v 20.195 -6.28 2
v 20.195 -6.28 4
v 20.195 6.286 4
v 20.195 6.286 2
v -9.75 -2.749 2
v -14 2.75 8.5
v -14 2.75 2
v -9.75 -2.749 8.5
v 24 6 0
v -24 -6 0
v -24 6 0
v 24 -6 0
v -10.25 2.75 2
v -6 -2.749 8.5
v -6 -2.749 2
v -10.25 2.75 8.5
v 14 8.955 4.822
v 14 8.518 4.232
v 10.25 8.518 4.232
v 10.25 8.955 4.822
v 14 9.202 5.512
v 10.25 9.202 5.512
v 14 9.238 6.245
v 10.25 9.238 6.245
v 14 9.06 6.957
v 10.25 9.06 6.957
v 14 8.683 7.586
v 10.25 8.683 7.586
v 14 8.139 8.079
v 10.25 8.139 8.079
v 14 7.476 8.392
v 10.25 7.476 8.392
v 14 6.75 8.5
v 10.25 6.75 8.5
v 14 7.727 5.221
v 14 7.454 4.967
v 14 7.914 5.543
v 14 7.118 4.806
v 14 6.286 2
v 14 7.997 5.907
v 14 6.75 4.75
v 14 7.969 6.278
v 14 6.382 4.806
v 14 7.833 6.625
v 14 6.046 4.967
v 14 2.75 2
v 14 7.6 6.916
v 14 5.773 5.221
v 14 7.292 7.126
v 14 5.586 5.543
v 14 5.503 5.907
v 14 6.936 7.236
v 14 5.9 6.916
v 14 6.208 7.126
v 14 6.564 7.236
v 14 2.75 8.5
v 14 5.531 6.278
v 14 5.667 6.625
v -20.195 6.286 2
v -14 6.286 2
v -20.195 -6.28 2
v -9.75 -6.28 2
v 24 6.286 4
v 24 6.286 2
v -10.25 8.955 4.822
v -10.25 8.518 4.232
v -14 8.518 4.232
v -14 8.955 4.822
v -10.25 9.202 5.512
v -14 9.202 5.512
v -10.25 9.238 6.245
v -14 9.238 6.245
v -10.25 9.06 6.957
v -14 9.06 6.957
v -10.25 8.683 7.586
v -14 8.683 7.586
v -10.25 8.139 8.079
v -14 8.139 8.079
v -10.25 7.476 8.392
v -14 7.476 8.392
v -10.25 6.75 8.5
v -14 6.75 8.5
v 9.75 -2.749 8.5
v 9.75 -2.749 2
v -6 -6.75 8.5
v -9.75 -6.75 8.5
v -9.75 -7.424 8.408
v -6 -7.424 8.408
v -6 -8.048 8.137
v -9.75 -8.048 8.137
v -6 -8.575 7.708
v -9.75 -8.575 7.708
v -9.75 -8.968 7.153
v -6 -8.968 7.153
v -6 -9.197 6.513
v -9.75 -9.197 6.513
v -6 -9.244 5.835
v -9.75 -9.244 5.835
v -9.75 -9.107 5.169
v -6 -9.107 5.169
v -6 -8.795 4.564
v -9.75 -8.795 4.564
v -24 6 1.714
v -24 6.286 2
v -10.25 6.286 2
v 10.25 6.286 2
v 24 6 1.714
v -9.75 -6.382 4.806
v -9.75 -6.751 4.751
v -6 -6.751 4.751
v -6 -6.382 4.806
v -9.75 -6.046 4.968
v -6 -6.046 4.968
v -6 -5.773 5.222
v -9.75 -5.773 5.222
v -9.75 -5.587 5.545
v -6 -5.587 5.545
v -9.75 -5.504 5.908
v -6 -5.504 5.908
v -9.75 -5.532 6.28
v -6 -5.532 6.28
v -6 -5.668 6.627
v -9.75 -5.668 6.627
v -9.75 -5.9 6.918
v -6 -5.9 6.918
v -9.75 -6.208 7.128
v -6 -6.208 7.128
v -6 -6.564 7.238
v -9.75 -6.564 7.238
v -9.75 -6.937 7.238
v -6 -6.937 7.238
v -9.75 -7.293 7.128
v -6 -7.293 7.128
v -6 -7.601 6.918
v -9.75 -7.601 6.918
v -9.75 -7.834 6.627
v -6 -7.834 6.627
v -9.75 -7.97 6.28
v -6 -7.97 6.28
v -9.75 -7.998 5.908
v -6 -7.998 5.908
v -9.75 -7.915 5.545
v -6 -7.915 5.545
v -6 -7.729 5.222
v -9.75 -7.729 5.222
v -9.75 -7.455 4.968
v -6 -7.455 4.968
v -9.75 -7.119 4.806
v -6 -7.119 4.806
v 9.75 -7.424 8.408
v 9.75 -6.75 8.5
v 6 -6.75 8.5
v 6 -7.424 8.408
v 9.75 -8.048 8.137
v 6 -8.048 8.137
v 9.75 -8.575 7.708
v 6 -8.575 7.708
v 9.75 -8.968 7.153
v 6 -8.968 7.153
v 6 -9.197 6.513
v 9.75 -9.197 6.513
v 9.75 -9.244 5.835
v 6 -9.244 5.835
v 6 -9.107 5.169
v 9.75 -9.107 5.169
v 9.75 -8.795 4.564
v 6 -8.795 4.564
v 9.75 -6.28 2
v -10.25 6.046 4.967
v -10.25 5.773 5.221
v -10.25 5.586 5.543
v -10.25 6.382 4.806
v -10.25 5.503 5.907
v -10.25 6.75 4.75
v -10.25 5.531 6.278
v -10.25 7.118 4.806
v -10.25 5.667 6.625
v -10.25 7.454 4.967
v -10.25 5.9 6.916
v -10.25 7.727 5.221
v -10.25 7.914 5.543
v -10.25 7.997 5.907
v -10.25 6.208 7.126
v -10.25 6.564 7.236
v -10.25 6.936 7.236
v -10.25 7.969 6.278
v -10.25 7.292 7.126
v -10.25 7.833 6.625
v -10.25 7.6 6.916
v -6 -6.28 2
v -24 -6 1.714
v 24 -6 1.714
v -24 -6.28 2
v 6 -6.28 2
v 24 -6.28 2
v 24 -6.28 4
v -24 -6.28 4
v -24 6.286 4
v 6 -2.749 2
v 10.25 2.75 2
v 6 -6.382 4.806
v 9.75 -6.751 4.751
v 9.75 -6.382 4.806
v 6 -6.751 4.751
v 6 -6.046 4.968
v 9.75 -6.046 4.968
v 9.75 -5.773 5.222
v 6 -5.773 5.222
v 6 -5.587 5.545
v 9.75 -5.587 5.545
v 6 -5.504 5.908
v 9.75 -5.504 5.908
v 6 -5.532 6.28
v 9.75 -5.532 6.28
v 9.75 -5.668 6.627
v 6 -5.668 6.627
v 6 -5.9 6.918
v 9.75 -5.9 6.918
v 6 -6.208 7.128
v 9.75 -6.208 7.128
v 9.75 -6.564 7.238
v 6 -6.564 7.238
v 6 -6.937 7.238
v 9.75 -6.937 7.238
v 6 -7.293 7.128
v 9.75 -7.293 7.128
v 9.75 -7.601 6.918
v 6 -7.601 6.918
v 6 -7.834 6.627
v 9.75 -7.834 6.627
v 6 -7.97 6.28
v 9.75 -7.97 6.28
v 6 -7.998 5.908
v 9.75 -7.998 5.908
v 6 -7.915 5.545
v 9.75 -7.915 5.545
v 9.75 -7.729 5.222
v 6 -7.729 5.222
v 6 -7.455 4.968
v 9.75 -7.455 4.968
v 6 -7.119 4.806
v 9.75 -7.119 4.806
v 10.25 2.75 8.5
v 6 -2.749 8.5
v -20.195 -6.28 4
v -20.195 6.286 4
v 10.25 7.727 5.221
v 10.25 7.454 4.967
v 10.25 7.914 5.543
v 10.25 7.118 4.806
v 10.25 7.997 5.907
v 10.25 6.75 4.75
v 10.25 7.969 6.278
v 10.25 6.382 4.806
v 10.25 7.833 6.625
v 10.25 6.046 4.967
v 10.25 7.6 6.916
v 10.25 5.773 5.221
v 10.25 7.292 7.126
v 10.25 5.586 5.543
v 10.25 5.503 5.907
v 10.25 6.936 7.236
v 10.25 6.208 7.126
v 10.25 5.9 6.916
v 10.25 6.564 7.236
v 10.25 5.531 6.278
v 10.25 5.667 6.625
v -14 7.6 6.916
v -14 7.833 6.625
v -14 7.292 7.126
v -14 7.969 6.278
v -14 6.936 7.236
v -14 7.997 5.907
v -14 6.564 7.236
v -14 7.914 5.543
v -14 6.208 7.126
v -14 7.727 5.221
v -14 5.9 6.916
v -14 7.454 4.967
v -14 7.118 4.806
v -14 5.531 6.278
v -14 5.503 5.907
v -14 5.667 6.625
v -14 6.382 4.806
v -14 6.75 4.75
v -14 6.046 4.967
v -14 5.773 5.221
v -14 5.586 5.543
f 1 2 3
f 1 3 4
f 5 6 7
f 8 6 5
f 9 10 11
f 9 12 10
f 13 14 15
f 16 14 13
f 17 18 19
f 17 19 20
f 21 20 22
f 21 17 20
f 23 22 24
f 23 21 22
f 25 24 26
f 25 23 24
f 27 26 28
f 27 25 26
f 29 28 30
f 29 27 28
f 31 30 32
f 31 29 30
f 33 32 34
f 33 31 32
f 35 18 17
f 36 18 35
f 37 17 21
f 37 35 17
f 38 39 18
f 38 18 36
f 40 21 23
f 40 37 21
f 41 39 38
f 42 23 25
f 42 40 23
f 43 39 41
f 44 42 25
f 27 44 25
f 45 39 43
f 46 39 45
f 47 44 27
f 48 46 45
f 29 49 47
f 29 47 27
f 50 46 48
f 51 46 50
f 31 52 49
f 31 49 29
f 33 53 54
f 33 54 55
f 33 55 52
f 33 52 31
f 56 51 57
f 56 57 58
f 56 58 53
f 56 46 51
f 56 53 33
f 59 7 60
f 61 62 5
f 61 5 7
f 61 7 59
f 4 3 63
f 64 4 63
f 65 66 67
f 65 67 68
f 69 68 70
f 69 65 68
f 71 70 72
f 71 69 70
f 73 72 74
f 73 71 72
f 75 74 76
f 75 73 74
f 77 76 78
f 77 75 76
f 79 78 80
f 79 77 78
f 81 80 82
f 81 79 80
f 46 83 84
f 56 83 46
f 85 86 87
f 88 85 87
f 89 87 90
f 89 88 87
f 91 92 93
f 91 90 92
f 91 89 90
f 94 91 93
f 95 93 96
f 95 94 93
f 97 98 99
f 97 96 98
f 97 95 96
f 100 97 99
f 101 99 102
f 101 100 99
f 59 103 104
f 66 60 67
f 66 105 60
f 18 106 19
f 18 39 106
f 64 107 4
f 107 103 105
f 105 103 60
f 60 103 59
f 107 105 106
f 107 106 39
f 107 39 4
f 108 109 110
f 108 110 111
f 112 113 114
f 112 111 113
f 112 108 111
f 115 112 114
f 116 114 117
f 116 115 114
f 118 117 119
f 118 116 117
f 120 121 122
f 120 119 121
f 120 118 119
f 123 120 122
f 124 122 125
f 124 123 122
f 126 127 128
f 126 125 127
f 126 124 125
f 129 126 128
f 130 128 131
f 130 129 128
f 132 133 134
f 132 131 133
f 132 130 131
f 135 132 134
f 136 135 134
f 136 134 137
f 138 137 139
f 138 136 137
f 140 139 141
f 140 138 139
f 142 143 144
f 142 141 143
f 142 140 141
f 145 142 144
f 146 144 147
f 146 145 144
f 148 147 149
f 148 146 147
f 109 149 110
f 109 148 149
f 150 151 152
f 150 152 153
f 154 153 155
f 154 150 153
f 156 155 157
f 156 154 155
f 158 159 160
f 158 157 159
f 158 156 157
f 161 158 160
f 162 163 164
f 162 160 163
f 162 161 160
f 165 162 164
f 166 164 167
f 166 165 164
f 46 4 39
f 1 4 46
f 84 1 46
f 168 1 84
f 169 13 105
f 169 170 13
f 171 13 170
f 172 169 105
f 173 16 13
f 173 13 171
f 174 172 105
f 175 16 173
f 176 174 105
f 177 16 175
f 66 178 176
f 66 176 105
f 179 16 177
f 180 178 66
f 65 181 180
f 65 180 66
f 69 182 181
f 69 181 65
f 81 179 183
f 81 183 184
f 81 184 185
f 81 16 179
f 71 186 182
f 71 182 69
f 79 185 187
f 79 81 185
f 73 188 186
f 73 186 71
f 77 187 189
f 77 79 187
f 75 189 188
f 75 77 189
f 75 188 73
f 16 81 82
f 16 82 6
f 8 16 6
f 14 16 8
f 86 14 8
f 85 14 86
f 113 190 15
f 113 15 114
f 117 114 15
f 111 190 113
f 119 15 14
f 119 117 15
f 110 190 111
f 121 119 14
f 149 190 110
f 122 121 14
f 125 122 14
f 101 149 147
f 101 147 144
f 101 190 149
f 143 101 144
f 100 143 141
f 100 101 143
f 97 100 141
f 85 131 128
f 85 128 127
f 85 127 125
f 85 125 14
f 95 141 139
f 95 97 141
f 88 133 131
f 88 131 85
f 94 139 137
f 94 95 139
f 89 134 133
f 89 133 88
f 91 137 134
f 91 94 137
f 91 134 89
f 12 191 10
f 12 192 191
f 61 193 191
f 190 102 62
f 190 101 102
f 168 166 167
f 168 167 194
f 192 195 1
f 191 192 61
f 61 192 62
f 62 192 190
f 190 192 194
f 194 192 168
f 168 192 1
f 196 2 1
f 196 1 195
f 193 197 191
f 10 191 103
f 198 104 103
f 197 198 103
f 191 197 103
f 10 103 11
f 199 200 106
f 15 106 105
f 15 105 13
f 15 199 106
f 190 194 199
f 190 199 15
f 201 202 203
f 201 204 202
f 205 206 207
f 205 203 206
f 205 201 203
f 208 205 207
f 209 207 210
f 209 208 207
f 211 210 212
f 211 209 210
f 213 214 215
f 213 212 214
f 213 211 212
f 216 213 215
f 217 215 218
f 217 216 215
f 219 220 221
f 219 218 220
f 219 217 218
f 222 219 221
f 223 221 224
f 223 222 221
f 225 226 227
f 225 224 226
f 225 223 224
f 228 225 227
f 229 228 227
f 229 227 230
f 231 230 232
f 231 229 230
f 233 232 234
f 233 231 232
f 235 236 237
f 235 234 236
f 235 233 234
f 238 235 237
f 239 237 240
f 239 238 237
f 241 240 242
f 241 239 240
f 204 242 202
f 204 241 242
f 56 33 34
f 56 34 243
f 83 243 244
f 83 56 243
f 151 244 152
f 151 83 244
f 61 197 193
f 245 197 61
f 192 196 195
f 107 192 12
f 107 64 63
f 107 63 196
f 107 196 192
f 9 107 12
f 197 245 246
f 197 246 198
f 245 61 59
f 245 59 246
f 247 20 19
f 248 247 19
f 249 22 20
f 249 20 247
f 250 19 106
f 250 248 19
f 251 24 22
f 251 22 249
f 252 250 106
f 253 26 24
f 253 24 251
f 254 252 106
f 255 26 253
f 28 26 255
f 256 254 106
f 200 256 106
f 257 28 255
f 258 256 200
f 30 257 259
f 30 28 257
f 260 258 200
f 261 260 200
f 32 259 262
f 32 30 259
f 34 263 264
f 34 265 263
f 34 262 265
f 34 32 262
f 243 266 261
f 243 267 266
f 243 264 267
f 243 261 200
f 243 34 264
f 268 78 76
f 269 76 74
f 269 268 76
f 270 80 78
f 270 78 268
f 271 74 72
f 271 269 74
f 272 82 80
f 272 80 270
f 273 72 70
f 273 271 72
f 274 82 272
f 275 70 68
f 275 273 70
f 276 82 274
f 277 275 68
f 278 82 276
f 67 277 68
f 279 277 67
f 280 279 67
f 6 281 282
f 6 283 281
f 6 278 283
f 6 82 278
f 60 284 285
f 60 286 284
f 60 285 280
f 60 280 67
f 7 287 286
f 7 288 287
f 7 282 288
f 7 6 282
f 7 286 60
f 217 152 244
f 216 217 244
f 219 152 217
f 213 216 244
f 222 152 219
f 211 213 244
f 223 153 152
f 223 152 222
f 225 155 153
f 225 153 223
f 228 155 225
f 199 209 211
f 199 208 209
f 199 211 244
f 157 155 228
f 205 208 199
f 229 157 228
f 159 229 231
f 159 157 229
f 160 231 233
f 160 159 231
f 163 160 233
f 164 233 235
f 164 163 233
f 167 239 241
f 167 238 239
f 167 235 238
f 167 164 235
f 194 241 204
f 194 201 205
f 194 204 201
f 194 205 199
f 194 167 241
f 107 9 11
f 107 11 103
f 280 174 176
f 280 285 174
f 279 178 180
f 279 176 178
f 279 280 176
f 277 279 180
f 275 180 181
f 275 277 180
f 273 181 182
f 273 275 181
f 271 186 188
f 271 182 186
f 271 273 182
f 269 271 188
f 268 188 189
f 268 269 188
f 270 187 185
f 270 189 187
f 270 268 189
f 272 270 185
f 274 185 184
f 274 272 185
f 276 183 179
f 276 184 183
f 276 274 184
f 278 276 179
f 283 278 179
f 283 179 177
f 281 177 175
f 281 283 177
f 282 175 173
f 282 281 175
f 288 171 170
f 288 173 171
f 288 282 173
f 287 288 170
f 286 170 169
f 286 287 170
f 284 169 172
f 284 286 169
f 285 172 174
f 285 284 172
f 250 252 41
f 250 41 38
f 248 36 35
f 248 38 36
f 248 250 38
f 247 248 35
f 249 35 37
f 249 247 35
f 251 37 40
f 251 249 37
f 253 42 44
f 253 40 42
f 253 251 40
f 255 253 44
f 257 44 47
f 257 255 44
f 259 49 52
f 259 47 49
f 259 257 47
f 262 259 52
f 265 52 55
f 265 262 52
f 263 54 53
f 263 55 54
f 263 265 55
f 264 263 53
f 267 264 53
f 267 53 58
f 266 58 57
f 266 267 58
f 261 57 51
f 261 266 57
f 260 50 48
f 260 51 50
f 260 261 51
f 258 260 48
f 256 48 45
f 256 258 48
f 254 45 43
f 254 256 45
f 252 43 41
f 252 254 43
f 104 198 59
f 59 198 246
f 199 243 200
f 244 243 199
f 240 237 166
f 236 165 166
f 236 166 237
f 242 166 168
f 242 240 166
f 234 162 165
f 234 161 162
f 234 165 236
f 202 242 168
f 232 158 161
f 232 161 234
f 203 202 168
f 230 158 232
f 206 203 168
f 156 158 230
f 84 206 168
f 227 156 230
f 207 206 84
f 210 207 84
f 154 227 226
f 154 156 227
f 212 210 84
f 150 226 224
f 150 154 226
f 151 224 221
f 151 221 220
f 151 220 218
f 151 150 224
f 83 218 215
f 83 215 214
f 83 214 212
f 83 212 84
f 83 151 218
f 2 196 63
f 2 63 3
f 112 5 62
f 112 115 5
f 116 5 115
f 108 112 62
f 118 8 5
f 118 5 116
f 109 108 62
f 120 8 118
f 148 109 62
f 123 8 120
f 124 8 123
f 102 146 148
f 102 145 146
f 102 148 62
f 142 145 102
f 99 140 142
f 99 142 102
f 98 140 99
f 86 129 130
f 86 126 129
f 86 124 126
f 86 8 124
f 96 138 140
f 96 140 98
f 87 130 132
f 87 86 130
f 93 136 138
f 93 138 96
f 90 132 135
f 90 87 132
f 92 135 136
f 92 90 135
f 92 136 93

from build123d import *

# Parameters (mm, degrees)
ESBO_O9_R                         = 1.250000058
ESBO_O9_R_2                       = 1.250559391
RESSALTO_EXTRUS_O2_DEPTH          = 24
CORTE_EXTRUS_O5_DEPTH             = 28.088973642
CORTE_EXTRUS_O5_DEPTH_BACK        = 28.088973642
ESBO_O12_OUTSIDE_W                = 60.428
ESBO_O12_OUTSIDE_H                = 20.928
CORTE_EXTRUS_O6_REACH             = 29.089
ESBO_O13_W                        = 3.805227374
ESBO_O13_H                        = 1.999999904
ESBO_O13_W_2                      = 36.154186404
ESBO_O13_H_2                      = 31.243547385
ESBO_O13_H_3                      = 1.961388226
CORTE_EXTRUS_O6_DIRECTION_2_DEPTH = 5000


with BuildPart() as part:
    # Esboço9 → Ressalto-extrusão2 (new, symmetric)
    with BuildSketch(Plane(origin=(0, 0, 0), x_dir=(0, 0, -1), z_dir=(1, 0, 0))):
        with BuildLine():
            Line((0, -5.999999999), (0, 5.999999999))
            Line((0, 5.999999999), (-1.714464294, 6.00000012))
            Line((-1.714464294, 6.00000012), (-4.232231545, 8.517767251))
            ThreePointArc((-4.232231545, 8.517767251), (-6.956707169, 9.059699215), (-8.499999099, 6.7500006))
            Line((-8.499999099, 6.7500006), (-8.499999099, -6.749999877))
            ThreePointArc((-8.499999099, -6.749999877), (-7.153358538, -8.968070124), (-4.564293582, -8.794809974))
            Line((-4.564293582, -8.794809974), (-1.714465141, -5.999999999))
            Line((-1.714465141, -5.999999999), (0, -5.999999999))
        make_face()
        with Locations((-5.999998683, 6.749999894)):
            Circle(ESBO_O9_R, mode=Mode.SUBTRACT)
        with Locations((-6.001403792, -6.750869293)):
            Circle(ESBO_O9_R_2, mode=Mode.SUBTRACT)
    extrude(amount=RESSALTO_EXTRUS_O2_DEPTH, both=True)

    # Esboço12 outside → Corte-extrusão5 (cut, two sides: drawn at the far end of the back side and taken through both)
    with BuildSketch(Plane(origin=(0, 0, 0), x_dir=(1, 0, 0), z_dir=(0, 1, 0)).offset(-CORTE_EXTRUS_O5_DEPTH_BACK)):
        with Locations((0, -4.25)):
            Rectangle(ESBO_O12_OUTSIDE_W, ESBO_O12_OUTSIDE_H)
        Polygon((-24, -4), (-24, 0), (24, 0), (24, -4), (20.194772626, -4), (20.194772626, -2), (14, -2), (14, -9.171977472), (6, -9.171977472), (6, -2), (-6, -2), (-6, -9.171977472), (-14, -9.171977472), (-14, -2), (-20.194772626, -2), (-20.194772626, -4), align=None, mode=Mode.SUBTRACT)
    extrude(amount=CORTE_EXTRUS_O5_DEPTH + CORTE_EXTRUS_O5_DEPTH_BACK, mode=Mode.SUBTRACT)

    # Corte-extrusão6: up to this face of the body (flat: up to its plane)
    corte_extrus_o6_end = Plane(part.part.faces().sort_by_distance((-17.097386313, 0.002756729, 2))[0])
    # Esboço13 → Corte-extrusão6 (cut, up to the picked face)
    with BuildSketch(Plane.XY.offset(8.499999099), mode=Mode.PRIVATE) as corte_extrus_o6_sk1:
        with Locations((-22.097386313, 7.285535765)):
            Rectangle(ESBO_O13_W, ESBO_O13_H)
    corte_extrus_o6_tool1 = split(extrude(corte_extrus_o6_sk1.sketch, amount=-CORTE_EXTRUS_O6_REACH, mode=Mode.PRIVATE), bisect_by=corte_extrus_o6_end, keep=Keep.BOTH, mode=Mode.PRIVATE)
    # Esboço13 → Corte-extrusão6 (cut, up to the picked face)
    with BuildSketch(Plane.XY.offset(8.499999099), mode=Mode.PRIVATE) as corte_extrus_o6_sk2:
        with Locations((-0.25062362, -2.463016757)):
            Rectangle(ESBO_O13_W_2, ESBO_O13_H_2)
        Polygon((-14, 9.25000031), (-14, 2.75000031), (-9.75, -2.749464751), (-9.75, -9.249464751), (-6, -9.249464751), (-6, -2.749464751), (-10.25, 2.75000031), (-10.25, 9.25000031), align=None, mode=Mode.SUBTRACT)
        Polygon((6, -2.749464751), (6, -9.249464751), (9.75, -9.249464751), (9.75, -2.749464751), (14, 2.75000031), (14, 9.25000031), (10.25, 9.25000031), (10.25, 2.75000031), align=None, mode=Mode.SUBTRACT)
    corte_extrus_o6_tool2 = split(extrude(corte_extrus_o6_sk2.sketch, amount=-CORTE_EXTRUS_O6_REACH, mode=Mode.PRIVATE), bisect_by=corte_extrus_o6_end, keep=Keep.BOTH, mode=Mode.PRIVATE)
    # Esboço13 → Corte-extrusão6 (cut, up to the picked face)
    with BuildSketch(Plane.XY.offset(8.499999099), mode=Mode.PRIVATE) as corte_extrus_o6_sk3:
        with Locations((-22.097386313, -7.260716467)):
            Rectangle(ESBO_O13_W, ESBO_O13_H_3)
    corte_extrus_o6_tool3 = split(extrude(corte_extrus_o6_sk3.sketch, amount=-CORTE_EXTRUS_O6_REACH, mode=Mode.PRIVATE), bisect_by=corte_extrus_o6_end, keep=Keep.BOTH, mode=Mode.PRIVATE)
    # Esboço13 → Corte-extrusão6 (cut, up to the picked face)
    with BuildSketch(Plane.XY.offset(8.499999099), mode=Mode.PRIVATE) as corte_extrus_o6_sk4:
        with Locations((22.097386313, 7.285535765)):
            Rectangle(ESBO_O13_W, ESBO_O13_H)
    corte_extrus_o6_tool4 = split(extrude(corte_extrus_o6_sk4.sketch, amount=-CORTE_EXTRUS_O6_REACH, mode=Mode.PRIVATE), bisect_by=corte_extrus_o6_end, keep=Keep.BOTH, mode=Mode.PRIVATE)
    # Esboço13 → Corte-extrusão6 (cut, up to the picked face)
    with BuildSketch(Plane.XY.offset(8.499999099), mode=Mode.PRIVATE) as corte_extrus_o6_sk5:
        with Locations((22.097386313, -7.260716467)):
            Rectangle(ESBO_O13_W, ESBO_O13_H_3)
    corte_extrus_o6_tool5 = split(extrude(corte_extrus_o6_sk5.sketch, amount=-CORTE_EXTRUS_O6_REACH, mode=Mode.PRIVATE), bisect_by=corte_extrus_o6_end, keep=Keep.BOTH, mode=Mode.PRIVATE)
    add(corte_extrus_o6_tool1.solids().sort_by(Axis((-22.097386, 7.285536, 8.499999), (0, 0, -1)))[0], mode=Mode.SUBTRACT)
    add(corte_extrus_o6_tool2.solids().sort_by(Axis((-0.285718, -2.807947, 8.499999), (0, 0, -1)))[0], mode=Mode.SUBTRACT)
    add(corte_extrus_o6_tool3.solids().sort_by(Axis((-22.097386, -7.260716, 8.499999), (0, 0, -1)))[0], mode=Mode.SUBTRACT)
    add(corte_extrus_o6_tool4.solids().sort_by(Axis((22.097386, 7.285536, 8.499999), (0, 0, -1)))[0], mode=Mode.SUBTRACT)
    add(corte_extrus_o6_tool5.solids().sort_by(Axis((22.097386, -7.260716, 8.499999), (0, 0, -1)))[0], mode=Mode.SUBTRACT)

    # Esboço13 → Corte-extrusão6 direction 2 (cut)
    # profile 1 of 5: a face of its own
    with BuildSketch(Plane.XY.offset(8.499999099)):
        with Locations((-22.097386313, 7.285535765)):
            Rectangle(ESBO_O13_W, ESBO_O13_H)
    # profile 2 of 5: a face of its own
    with BuildSketch(Plane.XY.offset(8.499999099)):
        with Locations((-0.25062362, -2.463016757)):
            Rectangle(ESBO_O13_W_2, ESBO_O13_H_2)
        Polygon((-14, 9.25000031), (-14, 2.75000031), (-9.75, -2.749464751), (-9.75, -9.249464751), (-6, -9.249464751), (-6, -2.749464751), (-10.25, 2.75000031), (-10.25, 9.25000031), align=None, mode=Mode.SUBTRACT)
        Polygon((6, -2.749464751), (6, -9.249464751), (9.75, -9.249464751), (9.75, -2.749464751), (14, 2.75000031), (14, 9.25000031), (10.25, 9.25000031), (10.25, 2.75000031), align=None, mode=Mode.SUBTRACT)
    # profile 3 of 5: a face of its own
    with BuildSketch(Plane.XY.offset(8.499999099)):
        with Locations((-22.097386313, -7.260716467)):
            Rectangle(ESBO_O13_W, ESBO_O13_H_3)
    # profile 4 of 5: a face of its own
    with BuildSketch(Plane.XY.offset(8.499999099)):
        with Locations((22.097386313, 7.285535765)):
            Rectangle(ESBO_O13_W, ESBO_O13_H)
    # profile 5 of 5: a face of its own
    with BuildSketch(Plane.XY.offset(8.499999099)):
        with Locations((22.097386313, -7.260716467)):
            Rectangle(ESBO_O13_W, ESBO_O13_H_3)
    extrude(amount=CORTE_EXTRUS_O6_DIRECTION_2_DEPTH, mode=Mode.SUBTRACT)


solid = part.part
